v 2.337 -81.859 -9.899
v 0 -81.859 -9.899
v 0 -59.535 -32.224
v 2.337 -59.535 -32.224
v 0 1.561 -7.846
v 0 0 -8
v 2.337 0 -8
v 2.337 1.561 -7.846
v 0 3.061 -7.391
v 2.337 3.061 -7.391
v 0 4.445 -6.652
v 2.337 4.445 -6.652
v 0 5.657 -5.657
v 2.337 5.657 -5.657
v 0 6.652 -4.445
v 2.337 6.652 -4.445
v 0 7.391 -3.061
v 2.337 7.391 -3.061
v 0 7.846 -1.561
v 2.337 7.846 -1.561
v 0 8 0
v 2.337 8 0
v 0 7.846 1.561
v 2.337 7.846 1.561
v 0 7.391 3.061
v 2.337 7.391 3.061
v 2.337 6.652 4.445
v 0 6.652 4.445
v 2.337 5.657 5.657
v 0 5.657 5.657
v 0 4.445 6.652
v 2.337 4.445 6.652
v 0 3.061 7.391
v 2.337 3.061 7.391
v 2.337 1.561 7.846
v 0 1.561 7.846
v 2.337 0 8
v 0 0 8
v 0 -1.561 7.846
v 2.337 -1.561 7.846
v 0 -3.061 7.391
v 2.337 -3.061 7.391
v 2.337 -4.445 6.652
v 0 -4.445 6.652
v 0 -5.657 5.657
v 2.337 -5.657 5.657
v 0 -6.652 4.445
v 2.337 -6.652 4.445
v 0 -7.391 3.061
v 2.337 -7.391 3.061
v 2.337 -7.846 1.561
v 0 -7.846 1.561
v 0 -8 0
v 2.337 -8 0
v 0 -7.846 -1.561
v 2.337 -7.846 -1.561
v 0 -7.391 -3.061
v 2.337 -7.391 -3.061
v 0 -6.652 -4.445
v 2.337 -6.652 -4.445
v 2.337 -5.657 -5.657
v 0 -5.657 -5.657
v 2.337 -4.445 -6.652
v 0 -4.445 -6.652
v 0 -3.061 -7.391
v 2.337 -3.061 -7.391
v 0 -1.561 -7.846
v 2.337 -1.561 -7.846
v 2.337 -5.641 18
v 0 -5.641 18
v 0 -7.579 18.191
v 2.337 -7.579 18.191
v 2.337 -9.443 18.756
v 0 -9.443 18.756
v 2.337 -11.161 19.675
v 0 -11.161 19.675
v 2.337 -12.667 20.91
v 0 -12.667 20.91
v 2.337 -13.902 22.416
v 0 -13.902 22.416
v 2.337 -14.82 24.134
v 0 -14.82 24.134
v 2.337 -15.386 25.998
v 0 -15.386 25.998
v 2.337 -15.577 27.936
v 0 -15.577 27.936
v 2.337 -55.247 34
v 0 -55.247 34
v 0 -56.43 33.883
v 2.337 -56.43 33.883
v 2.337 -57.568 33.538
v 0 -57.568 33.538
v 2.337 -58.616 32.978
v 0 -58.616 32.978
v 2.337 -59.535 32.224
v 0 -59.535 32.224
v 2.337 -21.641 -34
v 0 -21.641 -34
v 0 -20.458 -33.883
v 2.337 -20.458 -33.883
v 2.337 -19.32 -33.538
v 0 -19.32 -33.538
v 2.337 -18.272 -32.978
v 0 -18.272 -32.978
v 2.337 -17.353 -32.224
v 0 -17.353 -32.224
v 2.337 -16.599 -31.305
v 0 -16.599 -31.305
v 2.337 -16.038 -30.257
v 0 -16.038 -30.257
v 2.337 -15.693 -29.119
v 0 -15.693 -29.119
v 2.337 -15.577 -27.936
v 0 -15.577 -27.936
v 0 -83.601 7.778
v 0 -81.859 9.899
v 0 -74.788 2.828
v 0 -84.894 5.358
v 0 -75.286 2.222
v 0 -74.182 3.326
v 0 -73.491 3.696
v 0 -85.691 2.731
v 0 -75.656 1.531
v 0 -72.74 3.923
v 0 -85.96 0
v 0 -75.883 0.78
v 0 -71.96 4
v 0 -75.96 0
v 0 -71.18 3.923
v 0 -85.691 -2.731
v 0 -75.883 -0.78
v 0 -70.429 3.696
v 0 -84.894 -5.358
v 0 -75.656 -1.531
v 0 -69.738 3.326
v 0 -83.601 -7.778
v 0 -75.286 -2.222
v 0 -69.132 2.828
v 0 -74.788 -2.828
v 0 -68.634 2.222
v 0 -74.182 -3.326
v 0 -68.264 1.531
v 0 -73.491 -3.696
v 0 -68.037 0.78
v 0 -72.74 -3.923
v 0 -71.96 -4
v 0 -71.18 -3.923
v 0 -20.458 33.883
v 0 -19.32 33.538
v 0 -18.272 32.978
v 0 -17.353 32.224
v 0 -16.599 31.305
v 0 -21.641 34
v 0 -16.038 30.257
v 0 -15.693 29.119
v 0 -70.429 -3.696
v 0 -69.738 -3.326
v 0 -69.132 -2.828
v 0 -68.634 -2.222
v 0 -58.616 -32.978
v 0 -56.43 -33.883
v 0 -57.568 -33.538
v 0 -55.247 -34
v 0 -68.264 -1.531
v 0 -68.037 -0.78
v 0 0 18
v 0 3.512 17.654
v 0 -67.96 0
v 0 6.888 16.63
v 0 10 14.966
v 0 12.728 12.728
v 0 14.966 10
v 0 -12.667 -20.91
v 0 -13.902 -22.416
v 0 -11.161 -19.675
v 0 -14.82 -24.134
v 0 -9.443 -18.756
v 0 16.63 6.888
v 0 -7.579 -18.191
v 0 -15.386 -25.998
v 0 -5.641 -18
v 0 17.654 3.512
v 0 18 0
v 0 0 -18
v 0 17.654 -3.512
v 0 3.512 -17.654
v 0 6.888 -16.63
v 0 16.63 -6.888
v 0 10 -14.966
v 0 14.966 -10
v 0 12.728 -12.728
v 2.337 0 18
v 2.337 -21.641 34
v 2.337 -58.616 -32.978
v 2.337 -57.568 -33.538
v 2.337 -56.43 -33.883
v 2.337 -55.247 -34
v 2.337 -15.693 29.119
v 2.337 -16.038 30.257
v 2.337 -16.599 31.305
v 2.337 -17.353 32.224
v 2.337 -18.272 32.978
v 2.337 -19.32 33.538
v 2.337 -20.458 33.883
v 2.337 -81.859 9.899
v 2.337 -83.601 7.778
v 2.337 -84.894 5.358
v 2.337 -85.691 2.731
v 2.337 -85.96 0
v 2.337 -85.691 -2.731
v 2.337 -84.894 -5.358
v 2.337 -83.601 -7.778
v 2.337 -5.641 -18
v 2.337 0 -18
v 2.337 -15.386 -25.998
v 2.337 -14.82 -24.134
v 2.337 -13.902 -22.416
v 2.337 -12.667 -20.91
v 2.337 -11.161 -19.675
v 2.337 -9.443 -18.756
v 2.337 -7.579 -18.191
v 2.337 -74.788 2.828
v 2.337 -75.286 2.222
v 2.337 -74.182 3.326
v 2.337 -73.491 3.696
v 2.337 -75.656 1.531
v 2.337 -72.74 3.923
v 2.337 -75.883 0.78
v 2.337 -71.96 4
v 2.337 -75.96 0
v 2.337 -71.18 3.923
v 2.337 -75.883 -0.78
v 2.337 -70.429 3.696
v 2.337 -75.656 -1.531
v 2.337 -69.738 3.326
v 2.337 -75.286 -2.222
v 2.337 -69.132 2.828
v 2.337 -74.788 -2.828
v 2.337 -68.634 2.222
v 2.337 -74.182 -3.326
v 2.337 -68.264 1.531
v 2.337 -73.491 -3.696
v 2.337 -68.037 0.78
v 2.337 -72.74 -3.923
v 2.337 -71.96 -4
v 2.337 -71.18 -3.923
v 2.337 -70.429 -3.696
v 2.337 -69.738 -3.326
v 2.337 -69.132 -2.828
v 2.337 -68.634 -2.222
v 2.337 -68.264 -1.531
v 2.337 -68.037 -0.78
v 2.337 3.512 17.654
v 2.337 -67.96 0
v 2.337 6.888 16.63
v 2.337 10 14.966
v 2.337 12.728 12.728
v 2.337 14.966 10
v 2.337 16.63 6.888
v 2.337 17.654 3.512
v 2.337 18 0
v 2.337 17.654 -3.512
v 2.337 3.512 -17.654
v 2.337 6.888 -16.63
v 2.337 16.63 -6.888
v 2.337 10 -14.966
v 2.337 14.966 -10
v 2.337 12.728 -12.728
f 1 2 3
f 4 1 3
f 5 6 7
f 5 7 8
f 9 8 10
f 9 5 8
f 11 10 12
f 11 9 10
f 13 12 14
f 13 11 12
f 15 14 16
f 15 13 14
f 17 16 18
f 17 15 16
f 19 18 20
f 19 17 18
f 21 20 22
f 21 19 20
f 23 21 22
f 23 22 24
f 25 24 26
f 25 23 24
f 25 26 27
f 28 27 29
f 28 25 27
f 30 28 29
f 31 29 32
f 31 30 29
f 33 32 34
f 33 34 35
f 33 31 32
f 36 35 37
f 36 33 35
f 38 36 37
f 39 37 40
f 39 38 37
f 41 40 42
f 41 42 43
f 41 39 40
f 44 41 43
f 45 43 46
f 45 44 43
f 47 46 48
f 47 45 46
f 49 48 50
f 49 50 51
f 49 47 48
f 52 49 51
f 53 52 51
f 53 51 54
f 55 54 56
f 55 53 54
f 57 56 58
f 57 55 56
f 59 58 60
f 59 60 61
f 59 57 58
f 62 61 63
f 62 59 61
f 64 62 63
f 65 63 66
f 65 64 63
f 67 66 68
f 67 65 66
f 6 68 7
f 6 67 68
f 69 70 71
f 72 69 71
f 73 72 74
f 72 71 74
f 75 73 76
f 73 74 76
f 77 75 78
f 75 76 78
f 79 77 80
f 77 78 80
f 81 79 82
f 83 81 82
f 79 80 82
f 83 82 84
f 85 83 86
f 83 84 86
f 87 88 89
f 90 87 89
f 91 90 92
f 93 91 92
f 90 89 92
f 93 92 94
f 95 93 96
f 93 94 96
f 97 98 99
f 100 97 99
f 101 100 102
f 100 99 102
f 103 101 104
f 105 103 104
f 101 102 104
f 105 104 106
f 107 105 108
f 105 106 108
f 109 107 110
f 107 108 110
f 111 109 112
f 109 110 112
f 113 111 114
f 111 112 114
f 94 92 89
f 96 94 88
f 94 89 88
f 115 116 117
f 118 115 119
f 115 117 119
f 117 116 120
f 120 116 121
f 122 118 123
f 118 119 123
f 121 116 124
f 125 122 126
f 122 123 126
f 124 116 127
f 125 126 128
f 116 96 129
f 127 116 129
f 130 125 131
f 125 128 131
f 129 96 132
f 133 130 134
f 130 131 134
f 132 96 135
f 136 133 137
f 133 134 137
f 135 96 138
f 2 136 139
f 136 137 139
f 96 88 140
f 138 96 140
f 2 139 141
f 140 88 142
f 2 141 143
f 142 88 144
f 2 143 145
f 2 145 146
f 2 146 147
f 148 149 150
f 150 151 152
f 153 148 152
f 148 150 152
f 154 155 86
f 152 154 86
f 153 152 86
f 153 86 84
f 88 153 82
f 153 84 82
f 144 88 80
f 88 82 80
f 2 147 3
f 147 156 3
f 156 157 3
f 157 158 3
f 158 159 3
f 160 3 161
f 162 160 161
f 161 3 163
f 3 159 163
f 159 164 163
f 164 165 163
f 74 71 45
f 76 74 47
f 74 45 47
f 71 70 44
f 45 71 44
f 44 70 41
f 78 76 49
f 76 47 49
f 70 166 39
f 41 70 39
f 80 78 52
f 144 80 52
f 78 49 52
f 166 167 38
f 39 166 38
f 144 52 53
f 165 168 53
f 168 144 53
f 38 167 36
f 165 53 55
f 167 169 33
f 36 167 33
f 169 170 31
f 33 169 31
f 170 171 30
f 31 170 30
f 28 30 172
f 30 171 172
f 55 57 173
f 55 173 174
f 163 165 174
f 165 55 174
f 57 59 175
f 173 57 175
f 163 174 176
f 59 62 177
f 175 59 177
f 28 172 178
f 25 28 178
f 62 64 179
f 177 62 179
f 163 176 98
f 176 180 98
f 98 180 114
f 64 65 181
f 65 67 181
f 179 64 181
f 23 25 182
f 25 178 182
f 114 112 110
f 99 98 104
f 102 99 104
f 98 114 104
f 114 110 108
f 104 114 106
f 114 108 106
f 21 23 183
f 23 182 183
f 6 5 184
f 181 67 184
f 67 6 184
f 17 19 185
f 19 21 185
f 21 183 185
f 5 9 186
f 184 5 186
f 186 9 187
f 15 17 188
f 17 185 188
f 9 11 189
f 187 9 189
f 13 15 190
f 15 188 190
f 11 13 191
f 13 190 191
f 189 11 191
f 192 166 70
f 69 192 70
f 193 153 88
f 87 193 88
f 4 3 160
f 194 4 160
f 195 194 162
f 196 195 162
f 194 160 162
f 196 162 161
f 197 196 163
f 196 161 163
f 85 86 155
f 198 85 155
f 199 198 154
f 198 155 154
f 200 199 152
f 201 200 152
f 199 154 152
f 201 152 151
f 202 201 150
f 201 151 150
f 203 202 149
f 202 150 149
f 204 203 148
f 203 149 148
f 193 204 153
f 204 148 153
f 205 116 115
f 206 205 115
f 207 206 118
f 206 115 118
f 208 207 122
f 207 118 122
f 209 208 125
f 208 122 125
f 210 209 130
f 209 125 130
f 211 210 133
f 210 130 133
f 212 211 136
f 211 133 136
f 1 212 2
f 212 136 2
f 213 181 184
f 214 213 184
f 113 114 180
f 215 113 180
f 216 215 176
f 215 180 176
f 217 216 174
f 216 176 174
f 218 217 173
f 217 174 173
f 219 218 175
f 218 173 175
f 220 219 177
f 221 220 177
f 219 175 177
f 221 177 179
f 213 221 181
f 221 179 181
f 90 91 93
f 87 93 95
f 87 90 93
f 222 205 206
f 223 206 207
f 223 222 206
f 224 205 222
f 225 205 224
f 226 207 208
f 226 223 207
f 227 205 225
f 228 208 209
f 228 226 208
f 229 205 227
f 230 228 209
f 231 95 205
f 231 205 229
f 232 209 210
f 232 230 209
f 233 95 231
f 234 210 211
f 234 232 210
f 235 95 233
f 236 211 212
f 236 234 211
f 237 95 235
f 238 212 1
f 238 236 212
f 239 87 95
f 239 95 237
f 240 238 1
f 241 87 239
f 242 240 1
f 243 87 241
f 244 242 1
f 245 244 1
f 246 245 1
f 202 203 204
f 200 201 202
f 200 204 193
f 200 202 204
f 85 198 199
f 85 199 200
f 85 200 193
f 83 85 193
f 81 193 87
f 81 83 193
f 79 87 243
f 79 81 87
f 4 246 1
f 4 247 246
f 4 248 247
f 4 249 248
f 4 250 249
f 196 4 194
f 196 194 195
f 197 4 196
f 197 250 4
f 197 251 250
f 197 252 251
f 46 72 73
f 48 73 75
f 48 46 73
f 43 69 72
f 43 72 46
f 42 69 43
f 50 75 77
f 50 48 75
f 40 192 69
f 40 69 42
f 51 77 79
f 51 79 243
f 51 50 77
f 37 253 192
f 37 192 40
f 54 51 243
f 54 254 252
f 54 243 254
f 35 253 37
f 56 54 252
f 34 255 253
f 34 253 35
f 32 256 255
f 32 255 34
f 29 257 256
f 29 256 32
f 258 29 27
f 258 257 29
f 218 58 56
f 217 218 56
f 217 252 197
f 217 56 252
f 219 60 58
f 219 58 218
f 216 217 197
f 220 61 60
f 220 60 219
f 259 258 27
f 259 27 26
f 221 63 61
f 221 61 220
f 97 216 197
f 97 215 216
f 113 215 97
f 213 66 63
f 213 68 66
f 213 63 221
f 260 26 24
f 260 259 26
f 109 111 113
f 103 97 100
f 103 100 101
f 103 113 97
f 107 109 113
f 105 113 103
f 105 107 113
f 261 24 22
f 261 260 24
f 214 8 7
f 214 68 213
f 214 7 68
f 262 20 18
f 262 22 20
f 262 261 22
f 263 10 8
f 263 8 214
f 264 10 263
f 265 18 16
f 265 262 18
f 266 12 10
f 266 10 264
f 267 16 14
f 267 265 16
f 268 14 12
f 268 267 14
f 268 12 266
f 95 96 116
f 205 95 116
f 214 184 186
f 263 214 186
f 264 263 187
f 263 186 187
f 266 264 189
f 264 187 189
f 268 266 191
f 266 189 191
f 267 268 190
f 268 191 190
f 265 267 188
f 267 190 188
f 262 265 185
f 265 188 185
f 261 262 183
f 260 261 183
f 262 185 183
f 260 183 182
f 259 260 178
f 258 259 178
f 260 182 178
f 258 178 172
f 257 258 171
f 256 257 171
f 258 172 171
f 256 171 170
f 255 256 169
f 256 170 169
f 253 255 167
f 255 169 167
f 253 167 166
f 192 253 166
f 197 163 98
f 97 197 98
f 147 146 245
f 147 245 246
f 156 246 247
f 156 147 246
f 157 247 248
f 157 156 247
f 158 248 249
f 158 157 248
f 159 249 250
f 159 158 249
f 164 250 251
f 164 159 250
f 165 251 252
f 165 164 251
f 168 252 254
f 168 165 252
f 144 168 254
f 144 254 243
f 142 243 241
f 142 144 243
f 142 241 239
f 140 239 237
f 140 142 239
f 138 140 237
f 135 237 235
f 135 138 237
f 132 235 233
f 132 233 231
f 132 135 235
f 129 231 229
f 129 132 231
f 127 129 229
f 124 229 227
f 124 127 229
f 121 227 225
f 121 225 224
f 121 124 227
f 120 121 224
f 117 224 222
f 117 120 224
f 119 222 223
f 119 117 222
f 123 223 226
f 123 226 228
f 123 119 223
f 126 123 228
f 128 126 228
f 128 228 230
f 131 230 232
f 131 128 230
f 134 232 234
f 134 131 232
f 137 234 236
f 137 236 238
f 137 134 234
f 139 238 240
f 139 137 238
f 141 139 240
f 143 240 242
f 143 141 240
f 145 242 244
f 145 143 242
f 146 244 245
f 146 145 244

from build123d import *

# Parameters (mm, degrees)
SKETCH1_R           = 8
SKETCH1_R_2         = 4
BOSS_EXTRUDE1_DEPTH = 2.3368


with BuildPart() as part:
    # Sketch1 → Boss-Extrude1 (new body)
    with BuildSketch(Plane(origin=(0, 0, 0), x_dir=(0, 0, -1), z_dir=(1, 0, 0))):
        with BuildLine():
            Line((-18, 0), (-18, -5.640538448))
            ThreePointArc((-18, -5.640538448), (-20.910261619, -12.666531518), (-27.936254688, -15.576793136))
            ThreePointArc((-27.936254688, -15.576793136), (-32.223970118, -17.352823019), (-34, -21.640538448))
            Line((-34, -21.640538448), (-34, -55.247304326))
            ThreePointArc((-34, -55.247304326), (-33.538424872, -57.567799195), (-32.223970118, -59.535019756))
            Line((-32.223970118, -59.535019756), (-9.899494937, -81.859494937))
            ThreePointArc((-9.899494937, -81.859494937), (0, -85.96), (9.899494937, -81.859494937))
            Line((9.899494937, -81.859494937), (32.223970118, -59.535019756))
            ThreePointArc((32.223970118, -59.535019756), (33.538424872, -57.567799195), (34, -55.247304326))
            Line((34, -55.247304326), (34, -21.640538448))
            ThreePointArc((34, -21.640538448), (32.223970118, -17.352823019), (27.936254688, -15.576793136))
            ThreePointArc((27.936254688, -15.576793136), (20.910261619, -12.666531518), (18, -5.640538448))
            Line((18, -5.640538448), (18, 0))
            ThreePointArc((18, 0), (0, 18), (-18, 0))
        make_face()
        Circle(SKETCH1_R, mode=Mode.SUBTRACT)
        with Locations((0, -71.96)):
            Circle(SKETCH1_R_2, mode=Mode.SUBTRACT)
    extrude(amount=BOSS_EXTRUDE1_DEPTH)


solid = part.part
